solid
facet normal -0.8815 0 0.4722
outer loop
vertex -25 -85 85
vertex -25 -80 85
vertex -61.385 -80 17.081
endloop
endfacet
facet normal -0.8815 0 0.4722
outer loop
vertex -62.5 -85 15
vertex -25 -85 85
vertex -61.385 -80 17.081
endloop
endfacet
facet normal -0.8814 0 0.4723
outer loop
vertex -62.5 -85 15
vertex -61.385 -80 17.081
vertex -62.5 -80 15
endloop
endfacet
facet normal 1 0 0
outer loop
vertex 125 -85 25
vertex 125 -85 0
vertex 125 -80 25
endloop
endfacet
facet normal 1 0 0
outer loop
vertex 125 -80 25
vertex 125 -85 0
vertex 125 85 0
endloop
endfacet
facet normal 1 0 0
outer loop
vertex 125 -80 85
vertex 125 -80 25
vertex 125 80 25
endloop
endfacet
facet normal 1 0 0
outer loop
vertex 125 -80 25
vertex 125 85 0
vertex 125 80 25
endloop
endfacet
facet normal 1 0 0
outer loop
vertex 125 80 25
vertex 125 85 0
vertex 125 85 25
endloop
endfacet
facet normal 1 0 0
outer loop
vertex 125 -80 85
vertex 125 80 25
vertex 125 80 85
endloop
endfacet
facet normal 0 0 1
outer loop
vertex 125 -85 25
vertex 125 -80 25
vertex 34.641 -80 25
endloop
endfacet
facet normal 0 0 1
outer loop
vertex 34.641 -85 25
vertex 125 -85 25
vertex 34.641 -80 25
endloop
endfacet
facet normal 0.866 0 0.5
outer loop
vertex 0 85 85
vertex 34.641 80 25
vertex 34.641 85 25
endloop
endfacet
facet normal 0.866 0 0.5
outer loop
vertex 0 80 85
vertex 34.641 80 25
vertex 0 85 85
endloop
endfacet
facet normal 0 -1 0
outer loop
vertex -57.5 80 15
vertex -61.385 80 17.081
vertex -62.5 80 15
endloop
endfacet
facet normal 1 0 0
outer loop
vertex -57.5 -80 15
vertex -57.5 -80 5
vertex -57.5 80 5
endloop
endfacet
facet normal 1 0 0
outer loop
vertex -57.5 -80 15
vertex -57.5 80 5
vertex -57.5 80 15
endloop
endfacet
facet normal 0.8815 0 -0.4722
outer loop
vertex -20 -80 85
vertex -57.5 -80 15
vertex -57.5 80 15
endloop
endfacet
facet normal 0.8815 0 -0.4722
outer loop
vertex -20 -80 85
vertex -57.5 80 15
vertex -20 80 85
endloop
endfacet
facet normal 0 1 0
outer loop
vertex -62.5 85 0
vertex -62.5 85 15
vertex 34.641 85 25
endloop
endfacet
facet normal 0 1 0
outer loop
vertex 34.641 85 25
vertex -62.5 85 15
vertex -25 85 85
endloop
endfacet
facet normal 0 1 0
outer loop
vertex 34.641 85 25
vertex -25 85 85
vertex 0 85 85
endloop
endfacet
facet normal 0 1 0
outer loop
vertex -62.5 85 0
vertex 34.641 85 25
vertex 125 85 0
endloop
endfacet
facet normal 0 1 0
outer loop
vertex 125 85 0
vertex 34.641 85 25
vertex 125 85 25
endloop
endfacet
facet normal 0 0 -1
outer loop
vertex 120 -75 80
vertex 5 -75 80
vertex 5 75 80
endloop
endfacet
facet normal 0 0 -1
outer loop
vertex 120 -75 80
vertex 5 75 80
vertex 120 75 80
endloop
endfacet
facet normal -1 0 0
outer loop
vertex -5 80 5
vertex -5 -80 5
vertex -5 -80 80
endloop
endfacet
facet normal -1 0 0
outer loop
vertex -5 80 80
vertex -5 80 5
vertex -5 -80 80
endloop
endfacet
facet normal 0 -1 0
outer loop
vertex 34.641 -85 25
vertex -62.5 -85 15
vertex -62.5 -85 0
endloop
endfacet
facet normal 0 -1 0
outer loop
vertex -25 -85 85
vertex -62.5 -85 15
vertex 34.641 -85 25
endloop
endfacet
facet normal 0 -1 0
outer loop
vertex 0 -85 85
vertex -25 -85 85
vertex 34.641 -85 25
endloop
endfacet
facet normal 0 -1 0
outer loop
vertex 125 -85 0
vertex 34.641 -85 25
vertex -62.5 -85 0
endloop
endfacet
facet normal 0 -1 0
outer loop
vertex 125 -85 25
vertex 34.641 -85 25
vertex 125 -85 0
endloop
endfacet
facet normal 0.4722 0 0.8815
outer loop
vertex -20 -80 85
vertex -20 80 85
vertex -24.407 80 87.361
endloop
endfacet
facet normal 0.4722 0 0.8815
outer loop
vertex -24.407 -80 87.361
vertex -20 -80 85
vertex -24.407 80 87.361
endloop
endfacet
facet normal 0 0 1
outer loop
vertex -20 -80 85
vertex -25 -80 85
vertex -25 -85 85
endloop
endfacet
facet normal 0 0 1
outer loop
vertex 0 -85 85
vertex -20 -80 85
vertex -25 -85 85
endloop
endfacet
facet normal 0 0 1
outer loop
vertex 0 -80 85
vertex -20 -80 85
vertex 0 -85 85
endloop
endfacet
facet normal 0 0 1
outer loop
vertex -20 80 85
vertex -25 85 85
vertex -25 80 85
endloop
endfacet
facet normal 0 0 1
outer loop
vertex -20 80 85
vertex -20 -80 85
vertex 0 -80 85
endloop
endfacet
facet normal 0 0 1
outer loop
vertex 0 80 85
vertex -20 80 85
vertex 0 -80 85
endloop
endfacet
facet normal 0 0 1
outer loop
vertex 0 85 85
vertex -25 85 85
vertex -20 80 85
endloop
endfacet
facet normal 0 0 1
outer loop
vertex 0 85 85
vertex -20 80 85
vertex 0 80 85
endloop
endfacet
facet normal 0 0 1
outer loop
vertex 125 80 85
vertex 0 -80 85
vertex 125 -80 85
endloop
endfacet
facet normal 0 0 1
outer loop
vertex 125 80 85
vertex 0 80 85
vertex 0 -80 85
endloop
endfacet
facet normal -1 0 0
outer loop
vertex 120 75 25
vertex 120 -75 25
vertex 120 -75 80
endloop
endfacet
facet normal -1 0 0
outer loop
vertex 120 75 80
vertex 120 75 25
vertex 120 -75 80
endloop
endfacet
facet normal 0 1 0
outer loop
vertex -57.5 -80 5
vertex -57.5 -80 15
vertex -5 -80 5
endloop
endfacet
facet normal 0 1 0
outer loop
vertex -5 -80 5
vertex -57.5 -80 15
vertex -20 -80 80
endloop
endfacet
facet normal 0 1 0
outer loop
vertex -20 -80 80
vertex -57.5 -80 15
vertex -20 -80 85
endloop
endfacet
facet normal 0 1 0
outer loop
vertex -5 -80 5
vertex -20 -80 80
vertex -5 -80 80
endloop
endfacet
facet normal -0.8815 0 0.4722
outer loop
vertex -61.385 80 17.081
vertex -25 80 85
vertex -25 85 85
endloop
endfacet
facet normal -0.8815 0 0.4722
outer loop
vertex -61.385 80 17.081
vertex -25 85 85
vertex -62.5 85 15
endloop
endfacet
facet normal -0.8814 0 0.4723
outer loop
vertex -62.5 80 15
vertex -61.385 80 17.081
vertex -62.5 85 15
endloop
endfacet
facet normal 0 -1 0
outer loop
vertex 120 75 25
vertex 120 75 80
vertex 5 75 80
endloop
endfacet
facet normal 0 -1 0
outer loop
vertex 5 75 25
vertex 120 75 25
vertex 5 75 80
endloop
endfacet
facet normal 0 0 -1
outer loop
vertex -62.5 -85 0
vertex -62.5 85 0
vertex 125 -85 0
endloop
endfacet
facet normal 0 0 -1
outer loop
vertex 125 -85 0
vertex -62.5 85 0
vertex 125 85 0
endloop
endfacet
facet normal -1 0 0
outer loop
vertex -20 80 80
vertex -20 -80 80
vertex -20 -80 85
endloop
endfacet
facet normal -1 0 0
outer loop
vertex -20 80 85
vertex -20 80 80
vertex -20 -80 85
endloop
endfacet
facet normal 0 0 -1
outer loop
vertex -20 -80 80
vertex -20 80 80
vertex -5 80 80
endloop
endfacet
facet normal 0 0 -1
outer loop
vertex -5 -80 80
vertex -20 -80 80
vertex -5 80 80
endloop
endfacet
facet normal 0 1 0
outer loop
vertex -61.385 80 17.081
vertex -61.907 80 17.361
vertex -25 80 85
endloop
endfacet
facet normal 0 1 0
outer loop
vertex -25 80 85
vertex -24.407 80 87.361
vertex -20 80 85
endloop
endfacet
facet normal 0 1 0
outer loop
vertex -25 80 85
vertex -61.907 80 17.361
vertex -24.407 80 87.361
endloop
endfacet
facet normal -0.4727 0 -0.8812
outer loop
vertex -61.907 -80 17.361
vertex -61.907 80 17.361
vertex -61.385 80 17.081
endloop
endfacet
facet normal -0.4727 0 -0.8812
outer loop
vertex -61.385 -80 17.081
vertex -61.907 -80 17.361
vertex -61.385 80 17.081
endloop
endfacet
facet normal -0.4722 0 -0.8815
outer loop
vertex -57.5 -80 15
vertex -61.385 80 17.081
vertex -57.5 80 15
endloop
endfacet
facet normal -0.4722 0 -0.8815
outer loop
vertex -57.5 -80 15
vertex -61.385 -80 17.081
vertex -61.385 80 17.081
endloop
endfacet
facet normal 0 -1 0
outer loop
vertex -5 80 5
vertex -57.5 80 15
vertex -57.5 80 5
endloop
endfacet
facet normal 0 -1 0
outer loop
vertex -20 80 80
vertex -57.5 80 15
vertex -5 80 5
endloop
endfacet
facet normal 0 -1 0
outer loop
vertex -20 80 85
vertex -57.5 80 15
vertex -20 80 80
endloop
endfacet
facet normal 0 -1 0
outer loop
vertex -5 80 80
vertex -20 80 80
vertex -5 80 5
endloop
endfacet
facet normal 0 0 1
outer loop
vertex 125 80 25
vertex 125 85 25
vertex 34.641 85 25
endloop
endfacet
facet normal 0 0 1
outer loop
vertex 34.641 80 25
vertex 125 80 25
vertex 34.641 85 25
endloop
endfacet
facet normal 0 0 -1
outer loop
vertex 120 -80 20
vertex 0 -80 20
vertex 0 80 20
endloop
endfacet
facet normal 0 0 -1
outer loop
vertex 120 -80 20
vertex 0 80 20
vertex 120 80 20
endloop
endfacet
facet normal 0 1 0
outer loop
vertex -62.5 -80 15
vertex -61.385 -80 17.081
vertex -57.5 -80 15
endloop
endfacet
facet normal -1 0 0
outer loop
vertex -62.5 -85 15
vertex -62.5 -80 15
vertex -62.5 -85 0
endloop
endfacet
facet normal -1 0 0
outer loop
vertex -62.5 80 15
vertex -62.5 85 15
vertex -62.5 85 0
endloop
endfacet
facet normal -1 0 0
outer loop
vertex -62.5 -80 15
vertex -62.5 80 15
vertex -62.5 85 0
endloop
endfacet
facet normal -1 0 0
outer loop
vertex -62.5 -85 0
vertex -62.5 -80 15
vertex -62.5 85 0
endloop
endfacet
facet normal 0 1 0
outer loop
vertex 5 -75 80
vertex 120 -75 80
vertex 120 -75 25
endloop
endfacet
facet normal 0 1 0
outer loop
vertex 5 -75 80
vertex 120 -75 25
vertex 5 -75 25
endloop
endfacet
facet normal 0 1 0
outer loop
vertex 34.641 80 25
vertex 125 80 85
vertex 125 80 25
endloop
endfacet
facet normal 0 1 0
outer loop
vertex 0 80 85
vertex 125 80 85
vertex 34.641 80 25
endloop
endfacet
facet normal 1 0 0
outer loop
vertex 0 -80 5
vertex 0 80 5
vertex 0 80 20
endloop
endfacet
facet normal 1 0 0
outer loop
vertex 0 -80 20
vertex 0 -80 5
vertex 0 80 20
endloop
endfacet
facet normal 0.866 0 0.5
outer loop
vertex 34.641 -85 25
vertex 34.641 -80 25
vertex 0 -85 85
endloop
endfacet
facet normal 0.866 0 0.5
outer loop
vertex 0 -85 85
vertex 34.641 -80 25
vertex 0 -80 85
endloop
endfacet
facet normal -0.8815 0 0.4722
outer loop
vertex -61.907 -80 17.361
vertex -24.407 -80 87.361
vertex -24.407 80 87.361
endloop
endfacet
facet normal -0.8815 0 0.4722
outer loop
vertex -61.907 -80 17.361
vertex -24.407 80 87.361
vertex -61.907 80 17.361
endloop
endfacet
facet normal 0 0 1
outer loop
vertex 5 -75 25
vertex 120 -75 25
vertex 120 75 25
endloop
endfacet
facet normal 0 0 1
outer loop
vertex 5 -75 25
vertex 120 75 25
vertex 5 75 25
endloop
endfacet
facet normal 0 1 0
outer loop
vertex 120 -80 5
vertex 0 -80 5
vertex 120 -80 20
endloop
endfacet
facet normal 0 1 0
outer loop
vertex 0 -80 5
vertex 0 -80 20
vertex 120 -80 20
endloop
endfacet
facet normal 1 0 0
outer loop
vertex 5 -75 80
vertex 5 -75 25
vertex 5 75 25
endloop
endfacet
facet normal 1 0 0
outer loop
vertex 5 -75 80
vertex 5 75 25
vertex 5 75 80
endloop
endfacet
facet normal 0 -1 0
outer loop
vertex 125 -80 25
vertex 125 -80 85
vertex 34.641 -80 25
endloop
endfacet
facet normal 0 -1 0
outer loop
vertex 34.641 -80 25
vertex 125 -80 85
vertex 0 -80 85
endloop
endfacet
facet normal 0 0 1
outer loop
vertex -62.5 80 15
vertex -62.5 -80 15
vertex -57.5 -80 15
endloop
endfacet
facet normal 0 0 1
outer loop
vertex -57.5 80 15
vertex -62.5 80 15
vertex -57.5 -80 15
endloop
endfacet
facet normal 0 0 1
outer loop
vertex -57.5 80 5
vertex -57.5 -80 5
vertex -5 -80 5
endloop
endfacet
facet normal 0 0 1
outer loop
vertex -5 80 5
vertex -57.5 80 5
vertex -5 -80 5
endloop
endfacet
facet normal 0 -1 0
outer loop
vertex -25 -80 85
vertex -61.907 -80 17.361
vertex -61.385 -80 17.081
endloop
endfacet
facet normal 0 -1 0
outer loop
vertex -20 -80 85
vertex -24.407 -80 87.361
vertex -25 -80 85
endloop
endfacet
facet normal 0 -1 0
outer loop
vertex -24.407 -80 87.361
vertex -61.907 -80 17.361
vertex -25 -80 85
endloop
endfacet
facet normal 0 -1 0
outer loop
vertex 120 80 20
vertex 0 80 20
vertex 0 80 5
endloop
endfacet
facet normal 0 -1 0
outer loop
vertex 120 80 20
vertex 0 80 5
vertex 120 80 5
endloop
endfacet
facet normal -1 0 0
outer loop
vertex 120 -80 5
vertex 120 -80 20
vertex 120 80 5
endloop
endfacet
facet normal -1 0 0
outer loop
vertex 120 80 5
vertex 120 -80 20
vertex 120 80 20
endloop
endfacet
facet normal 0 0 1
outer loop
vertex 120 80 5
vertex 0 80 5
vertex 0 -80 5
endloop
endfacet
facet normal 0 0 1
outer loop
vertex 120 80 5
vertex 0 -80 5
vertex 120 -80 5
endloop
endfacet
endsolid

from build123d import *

# Parameters (mm, degrees)
SKETCH_W     = 177.5
SKETCH_H     = 160
PAD_DEPTH    = 5
SKETCH001_W  = 5
SKETCH001_H  = 15
PAD001_DEPTH = 160
SKETCH002_W  = 5
SKETCH002_H  = 75
PAD002_DEPTH = 160
SKETCH003_W  = 20
SKETCH003_H  = 5
PAD003_DEPTH = 160
SKETCH004_W  = 120
SKETCH004_H  = 5
PAD004_DEPTH = 160
SKETCH005_W  = 160
SKETCH005_H  = 25
PAD005_DEPTH = 5
PAD006_DEPTH = 5
PAD007_DEPTH = 160
SKETCH008_W  = 125
SKETCH008_H  = 60
PAD008_DEPTH = 5
SKETCH009_W  = 5
SKETCH009_H  = 60
PAD009_DEPTH = 150
SKETCH010_W  = 5
SKETCH010_H  = 60
PAD010_DEPTH = 150
SKETCH011_W  = 115
SKETCH011_H  = 150
PAD011_DEPTH = 5


with BuildPart() as part:
    # Sketch → Pad (new body)
    with BuildSketch(Plane.XY):
        with Locations((31.25, 0)):
            Rectangle(SKETCH_W, SKETCH_H)
    extrude(amount=PAD_DEPTH)

    # Sketch001 (on Face3 of Pad) → Pad001 (join)
    with BuildSketch(Plane.XZ.offset(80)):
        with Locations((-60, 7.5)):
            Rectangle(SKETCH001_W, SKETCH001_H)
    extrude(amount=-PAD001_DEPTH)

    # Sketch002 (on Face3 of Pad001) → Pad002 (join)
    with BuildSketch(Plane.XZ.offset(80)):
        with Locations((-2.5, 42.5)):
            Rectangle(SKETCH002_W, SKETCH002_H)
    extrude(amount=-PAD002_DEPTH)

    # Sketch003 (on Face10 of Pad002) → Pad003 (join)
    with BuildSketch(Plane.XZ.offset(80)):
        with Locations((-10, 82.5)):
            Rectangle(SKETCH003_W, SKETCH003_H)
    extrude(amount=-PAD003_DEPTH)

    # Sketch004 (on Face3 of Pad003) → Pad004 (join)
    with BuildSketch(Plane.XZ.offset(80)):
        with Locations((60, 22.5)):
            Rectangle(SKETCH004_W, SKETCH004_H)
    extrude(amount=-PAD004_DEPTH)

    # Sketch005 (on Face28 of Pad004) → Pad005 (join)
    with BuildSketch(Plane.YZ.offset(120)):
        with Locations((0, 12.5)):
            Rectangle(SKETCH005_W, SKETCH005_H)
    extrude(amount=PAD005_DEPTH)

    # Sketch006 (on Face11 of Pad005) → Pad006 (join)
    with BuildSketch(Plane(origin=(0, 80, 0), x_dir=(-1, 0, 0), z_dir=(0, 1, 0))):
        Polygon((62.5, 15), (62.5, 0), (-125, 0), (-125, 25), (-34.641016, 25), (0, 85), (25, 85), align=None)
    pad006 = extrude(amount=PAD006_DEPTH)

    # Sketch007 (on Face14 of Pad006) → Pad007 (join)
    with BuildSketch(Plane.XZ.offset(80)):
        Polygon((-57.5, 15), (-20, 85), (-24.4074, 87.361107), (-61.9074, 17.361107), align=None)
    extrude(amount=-PAD007_DEPTH)

    # Mirrored: Pad006 across XZ
    add(pad006.mirror(Plane.XZ))

    # Sketch008 (on Face36 of Mirrored) → Pad008 (join)
    with BuildSketch(Plane(origin=(0, -80, 0), x_dir=(-1, 0, 0), z_dir=(0, 1, 0))):
        with Locations((-62.5, 55)):
            Rectangle(SKETCH008_W, SKETCH008_H)
    pad008 = extrude(amount=PAD008_DEPTH)

    # Sketch009 (on Face37 of Pad008) → Pad009 (join)
    with BuildSketch(Plane(origin=(0, -75, 0), x_dir=(-1, 0, 0), z_dir=(0, 1, 0))):
        with Locations((-122.5, 55)):
            Rectangle(SKETCH009_W, SKETCH009_H)
    extrude(amount=PAD009_DEPTH)

    # Sketch010 (on Face39 of Pad009) → Pad010 (join)
    with BuildSketch(Plane(origin=(0, -75, 0), x_dir=(-1, 0, 0), z_dir=(0, 1, 0))):
        with Locations((-2.5, 55)):
            Rectangle(SKETCH010_W, SKETCH010_H)
    extrude(amount=PAD010_DEPTH)

    # Mirrored001: Pad008 across XZ
    add(pad008.mirror(Plane.XZ))

    # Sketch011 (on Face30 of Mirrored001) → Pad011 (join)
    with BuildSketch(Plane.XY.offset(85)):
        with Locations((62.5, 0)):
            Rectangle(SKETCH011_W, SKETCH011_H)
    extrude(amount=-PAD011_DEPTH)


solid = part.part
